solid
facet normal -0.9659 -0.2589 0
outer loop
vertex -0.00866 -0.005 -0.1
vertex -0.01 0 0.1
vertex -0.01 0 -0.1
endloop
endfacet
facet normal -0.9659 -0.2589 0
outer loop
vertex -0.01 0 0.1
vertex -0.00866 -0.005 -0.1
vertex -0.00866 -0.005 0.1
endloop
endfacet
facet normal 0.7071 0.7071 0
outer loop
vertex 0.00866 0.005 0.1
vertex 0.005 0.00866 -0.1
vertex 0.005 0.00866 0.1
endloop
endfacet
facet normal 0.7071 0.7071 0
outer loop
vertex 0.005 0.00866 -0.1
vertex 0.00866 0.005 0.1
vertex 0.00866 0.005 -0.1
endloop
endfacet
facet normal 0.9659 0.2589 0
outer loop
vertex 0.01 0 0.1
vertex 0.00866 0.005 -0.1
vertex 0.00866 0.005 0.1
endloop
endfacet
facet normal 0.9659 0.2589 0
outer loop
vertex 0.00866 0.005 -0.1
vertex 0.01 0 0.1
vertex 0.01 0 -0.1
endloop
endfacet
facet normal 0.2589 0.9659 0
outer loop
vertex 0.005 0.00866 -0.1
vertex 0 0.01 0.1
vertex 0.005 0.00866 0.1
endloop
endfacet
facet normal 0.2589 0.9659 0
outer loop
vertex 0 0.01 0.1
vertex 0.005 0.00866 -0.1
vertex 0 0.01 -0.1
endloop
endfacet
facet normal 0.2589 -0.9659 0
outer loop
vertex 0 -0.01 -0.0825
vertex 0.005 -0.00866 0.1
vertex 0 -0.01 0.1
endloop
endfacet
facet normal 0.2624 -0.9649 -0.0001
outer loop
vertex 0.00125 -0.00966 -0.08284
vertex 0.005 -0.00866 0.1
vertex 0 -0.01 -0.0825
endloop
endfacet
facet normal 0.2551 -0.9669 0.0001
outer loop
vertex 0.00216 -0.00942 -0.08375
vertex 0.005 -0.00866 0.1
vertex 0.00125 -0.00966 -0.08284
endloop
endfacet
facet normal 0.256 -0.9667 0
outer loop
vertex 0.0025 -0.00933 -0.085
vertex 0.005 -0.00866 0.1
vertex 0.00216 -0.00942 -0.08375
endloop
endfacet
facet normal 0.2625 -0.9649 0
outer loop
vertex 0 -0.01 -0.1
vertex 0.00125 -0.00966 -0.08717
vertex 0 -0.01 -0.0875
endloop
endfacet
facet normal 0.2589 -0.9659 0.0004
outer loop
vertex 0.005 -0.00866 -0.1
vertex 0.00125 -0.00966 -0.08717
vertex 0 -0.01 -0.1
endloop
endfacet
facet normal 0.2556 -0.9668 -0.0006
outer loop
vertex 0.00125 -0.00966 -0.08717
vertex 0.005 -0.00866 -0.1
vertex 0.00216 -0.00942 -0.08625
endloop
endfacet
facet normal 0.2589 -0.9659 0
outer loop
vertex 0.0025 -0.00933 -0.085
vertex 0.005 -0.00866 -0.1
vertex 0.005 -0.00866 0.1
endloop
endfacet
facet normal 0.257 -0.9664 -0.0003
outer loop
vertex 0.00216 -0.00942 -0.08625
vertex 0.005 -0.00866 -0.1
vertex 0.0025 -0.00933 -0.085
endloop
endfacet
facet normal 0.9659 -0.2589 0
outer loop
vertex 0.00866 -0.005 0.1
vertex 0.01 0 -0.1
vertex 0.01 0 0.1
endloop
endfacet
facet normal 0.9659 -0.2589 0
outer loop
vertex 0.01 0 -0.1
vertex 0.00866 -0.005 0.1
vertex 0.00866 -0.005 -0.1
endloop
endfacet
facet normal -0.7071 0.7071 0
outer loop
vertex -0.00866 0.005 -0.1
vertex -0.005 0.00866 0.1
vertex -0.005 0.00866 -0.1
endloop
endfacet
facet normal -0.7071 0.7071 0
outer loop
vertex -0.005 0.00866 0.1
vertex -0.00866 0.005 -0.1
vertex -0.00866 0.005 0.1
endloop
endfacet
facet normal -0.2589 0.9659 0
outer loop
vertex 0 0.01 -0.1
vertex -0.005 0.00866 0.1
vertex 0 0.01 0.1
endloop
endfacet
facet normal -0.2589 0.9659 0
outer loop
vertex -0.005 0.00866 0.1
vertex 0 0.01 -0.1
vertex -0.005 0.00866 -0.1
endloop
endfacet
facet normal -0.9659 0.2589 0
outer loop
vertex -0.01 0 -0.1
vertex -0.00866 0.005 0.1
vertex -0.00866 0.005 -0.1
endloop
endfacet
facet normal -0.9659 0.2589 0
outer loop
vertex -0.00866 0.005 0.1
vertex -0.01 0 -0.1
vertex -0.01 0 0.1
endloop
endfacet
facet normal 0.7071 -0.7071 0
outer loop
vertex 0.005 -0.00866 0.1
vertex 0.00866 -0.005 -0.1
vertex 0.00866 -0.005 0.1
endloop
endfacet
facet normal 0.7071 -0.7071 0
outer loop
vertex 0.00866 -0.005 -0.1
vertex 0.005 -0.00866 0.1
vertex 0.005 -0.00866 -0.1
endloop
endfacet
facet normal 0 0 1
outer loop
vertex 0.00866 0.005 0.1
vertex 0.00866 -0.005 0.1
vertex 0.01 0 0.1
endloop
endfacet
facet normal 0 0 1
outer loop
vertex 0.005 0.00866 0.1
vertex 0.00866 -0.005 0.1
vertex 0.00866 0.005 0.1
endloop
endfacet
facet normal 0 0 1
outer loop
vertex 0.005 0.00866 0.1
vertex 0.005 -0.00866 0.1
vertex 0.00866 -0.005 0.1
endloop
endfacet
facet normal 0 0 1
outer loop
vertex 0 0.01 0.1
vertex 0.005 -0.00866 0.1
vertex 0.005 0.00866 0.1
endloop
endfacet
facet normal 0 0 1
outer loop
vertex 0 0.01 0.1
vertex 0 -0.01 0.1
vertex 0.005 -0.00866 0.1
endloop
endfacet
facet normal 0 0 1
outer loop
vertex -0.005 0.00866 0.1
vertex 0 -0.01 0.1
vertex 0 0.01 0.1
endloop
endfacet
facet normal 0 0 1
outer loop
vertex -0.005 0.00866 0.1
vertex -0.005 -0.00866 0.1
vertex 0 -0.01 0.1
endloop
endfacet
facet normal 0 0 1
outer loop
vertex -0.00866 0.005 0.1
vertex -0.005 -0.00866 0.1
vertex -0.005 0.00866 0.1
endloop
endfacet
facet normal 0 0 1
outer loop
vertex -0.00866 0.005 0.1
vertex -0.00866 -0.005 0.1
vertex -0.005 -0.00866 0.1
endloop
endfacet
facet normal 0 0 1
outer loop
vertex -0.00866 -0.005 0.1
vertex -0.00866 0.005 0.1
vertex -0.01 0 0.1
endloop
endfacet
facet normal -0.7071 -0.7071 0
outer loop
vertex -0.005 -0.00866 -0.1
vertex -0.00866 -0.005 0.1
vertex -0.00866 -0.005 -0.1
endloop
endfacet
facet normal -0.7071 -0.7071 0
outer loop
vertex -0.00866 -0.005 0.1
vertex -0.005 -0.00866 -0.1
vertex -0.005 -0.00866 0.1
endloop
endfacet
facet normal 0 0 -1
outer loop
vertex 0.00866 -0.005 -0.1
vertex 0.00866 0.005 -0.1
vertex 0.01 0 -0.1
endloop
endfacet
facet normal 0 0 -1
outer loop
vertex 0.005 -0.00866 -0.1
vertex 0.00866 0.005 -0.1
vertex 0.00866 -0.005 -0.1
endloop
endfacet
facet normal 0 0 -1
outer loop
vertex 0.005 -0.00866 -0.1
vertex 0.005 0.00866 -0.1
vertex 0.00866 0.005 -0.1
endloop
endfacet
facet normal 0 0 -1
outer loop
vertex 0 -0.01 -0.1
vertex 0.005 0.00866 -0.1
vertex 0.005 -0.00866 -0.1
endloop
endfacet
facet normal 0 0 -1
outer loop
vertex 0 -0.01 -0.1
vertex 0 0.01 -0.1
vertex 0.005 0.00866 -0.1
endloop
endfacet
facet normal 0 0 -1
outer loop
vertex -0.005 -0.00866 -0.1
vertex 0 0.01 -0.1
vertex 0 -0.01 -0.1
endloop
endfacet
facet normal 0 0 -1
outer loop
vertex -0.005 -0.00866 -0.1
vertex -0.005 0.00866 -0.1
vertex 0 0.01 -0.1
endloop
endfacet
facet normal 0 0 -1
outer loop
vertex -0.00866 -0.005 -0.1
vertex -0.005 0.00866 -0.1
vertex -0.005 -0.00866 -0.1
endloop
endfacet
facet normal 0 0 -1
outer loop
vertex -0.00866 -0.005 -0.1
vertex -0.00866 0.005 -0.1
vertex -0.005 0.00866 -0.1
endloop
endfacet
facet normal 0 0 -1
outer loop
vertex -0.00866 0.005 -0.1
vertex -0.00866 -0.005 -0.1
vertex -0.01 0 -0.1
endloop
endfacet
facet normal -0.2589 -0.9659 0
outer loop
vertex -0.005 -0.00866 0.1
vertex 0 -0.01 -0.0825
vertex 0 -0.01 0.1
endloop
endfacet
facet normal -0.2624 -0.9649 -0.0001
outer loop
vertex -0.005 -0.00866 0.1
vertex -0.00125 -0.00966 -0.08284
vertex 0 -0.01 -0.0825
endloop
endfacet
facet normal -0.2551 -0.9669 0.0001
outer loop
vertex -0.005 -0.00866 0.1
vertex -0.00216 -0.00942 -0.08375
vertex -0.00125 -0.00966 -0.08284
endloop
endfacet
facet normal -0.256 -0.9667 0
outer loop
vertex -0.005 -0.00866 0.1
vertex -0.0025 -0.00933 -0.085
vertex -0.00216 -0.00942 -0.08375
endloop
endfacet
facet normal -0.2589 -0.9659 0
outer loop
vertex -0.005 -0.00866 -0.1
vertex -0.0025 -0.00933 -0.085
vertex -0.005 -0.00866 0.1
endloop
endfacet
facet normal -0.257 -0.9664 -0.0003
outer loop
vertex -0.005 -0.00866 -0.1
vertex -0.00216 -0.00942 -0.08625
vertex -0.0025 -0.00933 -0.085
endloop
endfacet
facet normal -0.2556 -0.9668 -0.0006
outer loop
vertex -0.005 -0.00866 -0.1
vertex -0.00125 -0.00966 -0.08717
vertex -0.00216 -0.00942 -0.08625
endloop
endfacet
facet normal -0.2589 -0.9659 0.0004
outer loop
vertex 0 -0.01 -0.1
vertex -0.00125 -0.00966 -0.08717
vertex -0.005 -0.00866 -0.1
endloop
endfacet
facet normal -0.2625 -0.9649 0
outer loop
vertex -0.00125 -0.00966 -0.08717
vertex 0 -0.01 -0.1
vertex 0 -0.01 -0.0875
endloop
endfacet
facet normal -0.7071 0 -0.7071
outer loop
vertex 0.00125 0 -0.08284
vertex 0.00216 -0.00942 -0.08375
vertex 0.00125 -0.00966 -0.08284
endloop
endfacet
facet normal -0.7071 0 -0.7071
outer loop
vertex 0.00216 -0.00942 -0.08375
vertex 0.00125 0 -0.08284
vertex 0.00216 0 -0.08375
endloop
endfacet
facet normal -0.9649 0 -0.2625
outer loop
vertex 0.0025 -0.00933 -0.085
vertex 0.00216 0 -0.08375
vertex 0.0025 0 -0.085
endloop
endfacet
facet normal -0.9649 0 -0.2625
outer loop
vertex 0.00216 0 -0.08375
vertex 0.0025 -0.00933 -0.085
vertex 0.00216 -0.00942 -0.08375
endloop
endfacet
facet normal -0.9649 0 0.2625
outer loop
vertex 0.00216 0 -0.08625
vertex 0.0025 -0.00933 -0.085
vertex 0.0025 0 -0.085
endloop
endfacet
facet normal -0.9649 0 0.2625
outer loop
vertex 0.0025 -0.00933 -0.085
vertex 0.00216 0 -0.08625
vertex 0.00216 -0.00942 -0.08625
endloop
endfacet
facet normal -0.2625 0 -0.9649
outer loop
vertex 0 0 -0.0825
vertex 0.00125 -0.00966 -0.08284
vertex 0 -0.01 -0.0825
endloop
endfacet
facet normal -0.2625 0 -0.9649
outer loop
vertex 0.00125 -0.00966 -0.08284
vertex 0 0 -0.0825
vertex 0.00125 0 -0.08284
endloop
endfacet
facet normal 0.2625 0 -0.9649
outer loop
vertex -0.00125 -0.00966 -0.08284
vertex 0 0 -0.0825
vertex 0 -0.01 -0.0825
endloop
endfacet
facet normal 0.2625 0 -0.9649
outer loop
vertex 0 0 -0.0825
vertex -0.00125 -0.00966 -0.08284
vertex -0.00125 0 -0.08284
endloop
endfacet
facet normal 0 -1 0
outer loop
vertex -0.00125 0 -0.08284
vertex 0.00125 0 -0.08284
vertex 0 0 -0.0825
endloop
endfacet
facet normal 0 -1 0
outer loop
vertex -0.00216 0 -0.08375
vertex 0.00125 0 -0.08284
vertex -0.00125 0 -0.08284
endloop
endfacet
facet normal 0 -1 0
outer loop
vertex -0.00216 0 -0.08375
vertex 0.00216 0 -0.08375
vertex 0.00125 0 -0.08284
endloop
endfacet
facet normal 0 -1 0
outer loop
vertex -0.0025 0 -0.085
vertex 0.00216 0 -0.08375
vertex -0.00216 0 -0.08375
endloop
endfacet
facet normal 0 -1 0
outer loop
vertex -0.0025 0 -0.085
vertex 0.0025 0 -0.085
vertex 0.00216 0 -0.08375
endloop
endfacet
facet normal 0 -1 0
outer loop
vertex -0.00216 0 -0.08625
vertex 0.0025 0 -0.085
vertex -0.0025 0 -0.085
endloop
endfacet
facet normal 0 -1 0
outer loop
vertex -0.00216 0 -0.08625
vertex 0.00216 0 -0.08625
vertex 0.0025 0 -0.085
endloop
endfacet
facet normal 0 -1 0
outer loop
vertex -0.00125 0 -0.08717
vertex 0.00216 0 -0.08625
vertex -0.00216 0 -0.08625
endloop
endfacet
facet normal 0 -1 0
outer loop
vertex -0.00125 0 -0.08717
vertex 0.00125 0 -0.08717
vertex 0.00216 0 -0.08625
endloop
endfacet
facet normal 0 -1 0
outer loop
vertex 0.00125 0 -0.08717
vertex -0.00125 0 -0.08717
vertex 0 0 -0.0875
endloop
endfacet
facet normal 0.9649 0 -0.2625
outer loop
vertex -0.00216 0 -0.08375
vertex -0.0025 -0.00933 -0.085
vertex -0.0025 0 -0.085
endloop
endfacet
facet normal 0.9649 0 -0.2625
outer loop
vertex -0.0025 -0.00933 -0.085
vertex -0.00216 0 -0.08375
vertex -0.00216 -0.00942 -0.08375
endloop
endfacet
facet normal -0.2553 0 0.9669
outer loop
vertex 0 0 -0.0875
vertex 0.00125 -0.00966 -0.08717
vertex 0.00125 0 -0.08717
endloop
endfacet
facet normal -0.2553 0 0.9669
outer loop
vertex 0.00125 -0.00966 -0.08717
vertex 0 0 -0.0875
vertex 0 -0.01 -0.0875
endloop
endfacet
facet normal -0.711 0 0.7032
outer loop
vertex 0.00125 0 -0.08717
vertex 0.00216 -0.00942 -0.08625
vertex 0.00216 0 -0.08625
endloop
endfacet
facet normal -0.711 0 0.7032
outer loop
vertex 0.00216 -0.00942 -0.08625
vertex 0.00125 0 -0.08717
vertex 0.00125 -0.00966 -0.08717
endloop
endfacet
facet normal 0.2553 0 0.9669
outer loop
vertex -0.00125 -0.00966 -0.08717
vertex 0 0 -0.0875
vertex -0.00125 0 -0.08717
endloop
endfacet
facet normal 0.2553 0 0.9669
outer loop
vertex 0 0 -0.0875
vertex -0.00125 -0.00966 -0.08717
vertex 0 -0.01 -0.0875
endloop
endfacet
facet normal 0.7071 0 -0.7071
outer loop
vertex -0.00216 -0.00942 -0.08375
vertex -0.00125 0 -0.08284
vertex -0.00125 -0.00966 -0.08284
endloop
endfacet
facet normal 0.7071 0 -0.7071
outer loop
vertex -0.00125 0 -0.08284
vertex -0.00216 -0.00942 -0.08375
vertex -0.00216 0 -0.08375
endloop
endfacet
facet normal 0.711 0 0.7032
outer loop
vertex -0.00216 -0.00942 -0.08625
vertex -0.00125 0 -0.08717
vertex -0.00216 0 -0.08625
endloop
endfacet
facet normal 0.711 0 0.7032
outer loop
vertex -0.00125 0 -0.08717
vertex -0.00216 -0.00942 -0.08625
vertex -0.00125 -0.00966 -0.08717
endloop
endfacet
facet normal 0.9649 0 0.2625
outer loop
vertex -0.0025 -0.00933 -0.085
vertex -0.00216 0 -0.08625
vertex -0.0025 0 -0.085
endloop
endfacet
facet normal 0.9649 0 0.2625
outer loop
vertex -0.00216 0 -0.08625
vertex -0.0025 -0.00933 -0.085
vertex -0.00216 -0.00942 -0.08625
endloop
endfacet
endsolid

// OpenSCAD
cylinder_rod_diameter = 0.02;
cylinder_rod_length = 0.2;
hole_diameter = 0.005;
hole_offset = 0.015;
$fn = 12; // Low-poly surface finish

module rod_with_hole() {
    difference() {
        // Main cylindrical rod
        cylinder(h = cylinder_rod_length, d = cylinder_rod_diameter, $fn = $fn);
        
        // Transverse through-hole
        translate([0, 0, hole_offset])
            rotate([90, 0, 0])
                cylinder(h = cylinder_rod_diameter, d = hole_diameter, $fn = $fn);
    }
}

translate([0, 0, -cylinder_rod_length / 2])
    rod_with_hole();
